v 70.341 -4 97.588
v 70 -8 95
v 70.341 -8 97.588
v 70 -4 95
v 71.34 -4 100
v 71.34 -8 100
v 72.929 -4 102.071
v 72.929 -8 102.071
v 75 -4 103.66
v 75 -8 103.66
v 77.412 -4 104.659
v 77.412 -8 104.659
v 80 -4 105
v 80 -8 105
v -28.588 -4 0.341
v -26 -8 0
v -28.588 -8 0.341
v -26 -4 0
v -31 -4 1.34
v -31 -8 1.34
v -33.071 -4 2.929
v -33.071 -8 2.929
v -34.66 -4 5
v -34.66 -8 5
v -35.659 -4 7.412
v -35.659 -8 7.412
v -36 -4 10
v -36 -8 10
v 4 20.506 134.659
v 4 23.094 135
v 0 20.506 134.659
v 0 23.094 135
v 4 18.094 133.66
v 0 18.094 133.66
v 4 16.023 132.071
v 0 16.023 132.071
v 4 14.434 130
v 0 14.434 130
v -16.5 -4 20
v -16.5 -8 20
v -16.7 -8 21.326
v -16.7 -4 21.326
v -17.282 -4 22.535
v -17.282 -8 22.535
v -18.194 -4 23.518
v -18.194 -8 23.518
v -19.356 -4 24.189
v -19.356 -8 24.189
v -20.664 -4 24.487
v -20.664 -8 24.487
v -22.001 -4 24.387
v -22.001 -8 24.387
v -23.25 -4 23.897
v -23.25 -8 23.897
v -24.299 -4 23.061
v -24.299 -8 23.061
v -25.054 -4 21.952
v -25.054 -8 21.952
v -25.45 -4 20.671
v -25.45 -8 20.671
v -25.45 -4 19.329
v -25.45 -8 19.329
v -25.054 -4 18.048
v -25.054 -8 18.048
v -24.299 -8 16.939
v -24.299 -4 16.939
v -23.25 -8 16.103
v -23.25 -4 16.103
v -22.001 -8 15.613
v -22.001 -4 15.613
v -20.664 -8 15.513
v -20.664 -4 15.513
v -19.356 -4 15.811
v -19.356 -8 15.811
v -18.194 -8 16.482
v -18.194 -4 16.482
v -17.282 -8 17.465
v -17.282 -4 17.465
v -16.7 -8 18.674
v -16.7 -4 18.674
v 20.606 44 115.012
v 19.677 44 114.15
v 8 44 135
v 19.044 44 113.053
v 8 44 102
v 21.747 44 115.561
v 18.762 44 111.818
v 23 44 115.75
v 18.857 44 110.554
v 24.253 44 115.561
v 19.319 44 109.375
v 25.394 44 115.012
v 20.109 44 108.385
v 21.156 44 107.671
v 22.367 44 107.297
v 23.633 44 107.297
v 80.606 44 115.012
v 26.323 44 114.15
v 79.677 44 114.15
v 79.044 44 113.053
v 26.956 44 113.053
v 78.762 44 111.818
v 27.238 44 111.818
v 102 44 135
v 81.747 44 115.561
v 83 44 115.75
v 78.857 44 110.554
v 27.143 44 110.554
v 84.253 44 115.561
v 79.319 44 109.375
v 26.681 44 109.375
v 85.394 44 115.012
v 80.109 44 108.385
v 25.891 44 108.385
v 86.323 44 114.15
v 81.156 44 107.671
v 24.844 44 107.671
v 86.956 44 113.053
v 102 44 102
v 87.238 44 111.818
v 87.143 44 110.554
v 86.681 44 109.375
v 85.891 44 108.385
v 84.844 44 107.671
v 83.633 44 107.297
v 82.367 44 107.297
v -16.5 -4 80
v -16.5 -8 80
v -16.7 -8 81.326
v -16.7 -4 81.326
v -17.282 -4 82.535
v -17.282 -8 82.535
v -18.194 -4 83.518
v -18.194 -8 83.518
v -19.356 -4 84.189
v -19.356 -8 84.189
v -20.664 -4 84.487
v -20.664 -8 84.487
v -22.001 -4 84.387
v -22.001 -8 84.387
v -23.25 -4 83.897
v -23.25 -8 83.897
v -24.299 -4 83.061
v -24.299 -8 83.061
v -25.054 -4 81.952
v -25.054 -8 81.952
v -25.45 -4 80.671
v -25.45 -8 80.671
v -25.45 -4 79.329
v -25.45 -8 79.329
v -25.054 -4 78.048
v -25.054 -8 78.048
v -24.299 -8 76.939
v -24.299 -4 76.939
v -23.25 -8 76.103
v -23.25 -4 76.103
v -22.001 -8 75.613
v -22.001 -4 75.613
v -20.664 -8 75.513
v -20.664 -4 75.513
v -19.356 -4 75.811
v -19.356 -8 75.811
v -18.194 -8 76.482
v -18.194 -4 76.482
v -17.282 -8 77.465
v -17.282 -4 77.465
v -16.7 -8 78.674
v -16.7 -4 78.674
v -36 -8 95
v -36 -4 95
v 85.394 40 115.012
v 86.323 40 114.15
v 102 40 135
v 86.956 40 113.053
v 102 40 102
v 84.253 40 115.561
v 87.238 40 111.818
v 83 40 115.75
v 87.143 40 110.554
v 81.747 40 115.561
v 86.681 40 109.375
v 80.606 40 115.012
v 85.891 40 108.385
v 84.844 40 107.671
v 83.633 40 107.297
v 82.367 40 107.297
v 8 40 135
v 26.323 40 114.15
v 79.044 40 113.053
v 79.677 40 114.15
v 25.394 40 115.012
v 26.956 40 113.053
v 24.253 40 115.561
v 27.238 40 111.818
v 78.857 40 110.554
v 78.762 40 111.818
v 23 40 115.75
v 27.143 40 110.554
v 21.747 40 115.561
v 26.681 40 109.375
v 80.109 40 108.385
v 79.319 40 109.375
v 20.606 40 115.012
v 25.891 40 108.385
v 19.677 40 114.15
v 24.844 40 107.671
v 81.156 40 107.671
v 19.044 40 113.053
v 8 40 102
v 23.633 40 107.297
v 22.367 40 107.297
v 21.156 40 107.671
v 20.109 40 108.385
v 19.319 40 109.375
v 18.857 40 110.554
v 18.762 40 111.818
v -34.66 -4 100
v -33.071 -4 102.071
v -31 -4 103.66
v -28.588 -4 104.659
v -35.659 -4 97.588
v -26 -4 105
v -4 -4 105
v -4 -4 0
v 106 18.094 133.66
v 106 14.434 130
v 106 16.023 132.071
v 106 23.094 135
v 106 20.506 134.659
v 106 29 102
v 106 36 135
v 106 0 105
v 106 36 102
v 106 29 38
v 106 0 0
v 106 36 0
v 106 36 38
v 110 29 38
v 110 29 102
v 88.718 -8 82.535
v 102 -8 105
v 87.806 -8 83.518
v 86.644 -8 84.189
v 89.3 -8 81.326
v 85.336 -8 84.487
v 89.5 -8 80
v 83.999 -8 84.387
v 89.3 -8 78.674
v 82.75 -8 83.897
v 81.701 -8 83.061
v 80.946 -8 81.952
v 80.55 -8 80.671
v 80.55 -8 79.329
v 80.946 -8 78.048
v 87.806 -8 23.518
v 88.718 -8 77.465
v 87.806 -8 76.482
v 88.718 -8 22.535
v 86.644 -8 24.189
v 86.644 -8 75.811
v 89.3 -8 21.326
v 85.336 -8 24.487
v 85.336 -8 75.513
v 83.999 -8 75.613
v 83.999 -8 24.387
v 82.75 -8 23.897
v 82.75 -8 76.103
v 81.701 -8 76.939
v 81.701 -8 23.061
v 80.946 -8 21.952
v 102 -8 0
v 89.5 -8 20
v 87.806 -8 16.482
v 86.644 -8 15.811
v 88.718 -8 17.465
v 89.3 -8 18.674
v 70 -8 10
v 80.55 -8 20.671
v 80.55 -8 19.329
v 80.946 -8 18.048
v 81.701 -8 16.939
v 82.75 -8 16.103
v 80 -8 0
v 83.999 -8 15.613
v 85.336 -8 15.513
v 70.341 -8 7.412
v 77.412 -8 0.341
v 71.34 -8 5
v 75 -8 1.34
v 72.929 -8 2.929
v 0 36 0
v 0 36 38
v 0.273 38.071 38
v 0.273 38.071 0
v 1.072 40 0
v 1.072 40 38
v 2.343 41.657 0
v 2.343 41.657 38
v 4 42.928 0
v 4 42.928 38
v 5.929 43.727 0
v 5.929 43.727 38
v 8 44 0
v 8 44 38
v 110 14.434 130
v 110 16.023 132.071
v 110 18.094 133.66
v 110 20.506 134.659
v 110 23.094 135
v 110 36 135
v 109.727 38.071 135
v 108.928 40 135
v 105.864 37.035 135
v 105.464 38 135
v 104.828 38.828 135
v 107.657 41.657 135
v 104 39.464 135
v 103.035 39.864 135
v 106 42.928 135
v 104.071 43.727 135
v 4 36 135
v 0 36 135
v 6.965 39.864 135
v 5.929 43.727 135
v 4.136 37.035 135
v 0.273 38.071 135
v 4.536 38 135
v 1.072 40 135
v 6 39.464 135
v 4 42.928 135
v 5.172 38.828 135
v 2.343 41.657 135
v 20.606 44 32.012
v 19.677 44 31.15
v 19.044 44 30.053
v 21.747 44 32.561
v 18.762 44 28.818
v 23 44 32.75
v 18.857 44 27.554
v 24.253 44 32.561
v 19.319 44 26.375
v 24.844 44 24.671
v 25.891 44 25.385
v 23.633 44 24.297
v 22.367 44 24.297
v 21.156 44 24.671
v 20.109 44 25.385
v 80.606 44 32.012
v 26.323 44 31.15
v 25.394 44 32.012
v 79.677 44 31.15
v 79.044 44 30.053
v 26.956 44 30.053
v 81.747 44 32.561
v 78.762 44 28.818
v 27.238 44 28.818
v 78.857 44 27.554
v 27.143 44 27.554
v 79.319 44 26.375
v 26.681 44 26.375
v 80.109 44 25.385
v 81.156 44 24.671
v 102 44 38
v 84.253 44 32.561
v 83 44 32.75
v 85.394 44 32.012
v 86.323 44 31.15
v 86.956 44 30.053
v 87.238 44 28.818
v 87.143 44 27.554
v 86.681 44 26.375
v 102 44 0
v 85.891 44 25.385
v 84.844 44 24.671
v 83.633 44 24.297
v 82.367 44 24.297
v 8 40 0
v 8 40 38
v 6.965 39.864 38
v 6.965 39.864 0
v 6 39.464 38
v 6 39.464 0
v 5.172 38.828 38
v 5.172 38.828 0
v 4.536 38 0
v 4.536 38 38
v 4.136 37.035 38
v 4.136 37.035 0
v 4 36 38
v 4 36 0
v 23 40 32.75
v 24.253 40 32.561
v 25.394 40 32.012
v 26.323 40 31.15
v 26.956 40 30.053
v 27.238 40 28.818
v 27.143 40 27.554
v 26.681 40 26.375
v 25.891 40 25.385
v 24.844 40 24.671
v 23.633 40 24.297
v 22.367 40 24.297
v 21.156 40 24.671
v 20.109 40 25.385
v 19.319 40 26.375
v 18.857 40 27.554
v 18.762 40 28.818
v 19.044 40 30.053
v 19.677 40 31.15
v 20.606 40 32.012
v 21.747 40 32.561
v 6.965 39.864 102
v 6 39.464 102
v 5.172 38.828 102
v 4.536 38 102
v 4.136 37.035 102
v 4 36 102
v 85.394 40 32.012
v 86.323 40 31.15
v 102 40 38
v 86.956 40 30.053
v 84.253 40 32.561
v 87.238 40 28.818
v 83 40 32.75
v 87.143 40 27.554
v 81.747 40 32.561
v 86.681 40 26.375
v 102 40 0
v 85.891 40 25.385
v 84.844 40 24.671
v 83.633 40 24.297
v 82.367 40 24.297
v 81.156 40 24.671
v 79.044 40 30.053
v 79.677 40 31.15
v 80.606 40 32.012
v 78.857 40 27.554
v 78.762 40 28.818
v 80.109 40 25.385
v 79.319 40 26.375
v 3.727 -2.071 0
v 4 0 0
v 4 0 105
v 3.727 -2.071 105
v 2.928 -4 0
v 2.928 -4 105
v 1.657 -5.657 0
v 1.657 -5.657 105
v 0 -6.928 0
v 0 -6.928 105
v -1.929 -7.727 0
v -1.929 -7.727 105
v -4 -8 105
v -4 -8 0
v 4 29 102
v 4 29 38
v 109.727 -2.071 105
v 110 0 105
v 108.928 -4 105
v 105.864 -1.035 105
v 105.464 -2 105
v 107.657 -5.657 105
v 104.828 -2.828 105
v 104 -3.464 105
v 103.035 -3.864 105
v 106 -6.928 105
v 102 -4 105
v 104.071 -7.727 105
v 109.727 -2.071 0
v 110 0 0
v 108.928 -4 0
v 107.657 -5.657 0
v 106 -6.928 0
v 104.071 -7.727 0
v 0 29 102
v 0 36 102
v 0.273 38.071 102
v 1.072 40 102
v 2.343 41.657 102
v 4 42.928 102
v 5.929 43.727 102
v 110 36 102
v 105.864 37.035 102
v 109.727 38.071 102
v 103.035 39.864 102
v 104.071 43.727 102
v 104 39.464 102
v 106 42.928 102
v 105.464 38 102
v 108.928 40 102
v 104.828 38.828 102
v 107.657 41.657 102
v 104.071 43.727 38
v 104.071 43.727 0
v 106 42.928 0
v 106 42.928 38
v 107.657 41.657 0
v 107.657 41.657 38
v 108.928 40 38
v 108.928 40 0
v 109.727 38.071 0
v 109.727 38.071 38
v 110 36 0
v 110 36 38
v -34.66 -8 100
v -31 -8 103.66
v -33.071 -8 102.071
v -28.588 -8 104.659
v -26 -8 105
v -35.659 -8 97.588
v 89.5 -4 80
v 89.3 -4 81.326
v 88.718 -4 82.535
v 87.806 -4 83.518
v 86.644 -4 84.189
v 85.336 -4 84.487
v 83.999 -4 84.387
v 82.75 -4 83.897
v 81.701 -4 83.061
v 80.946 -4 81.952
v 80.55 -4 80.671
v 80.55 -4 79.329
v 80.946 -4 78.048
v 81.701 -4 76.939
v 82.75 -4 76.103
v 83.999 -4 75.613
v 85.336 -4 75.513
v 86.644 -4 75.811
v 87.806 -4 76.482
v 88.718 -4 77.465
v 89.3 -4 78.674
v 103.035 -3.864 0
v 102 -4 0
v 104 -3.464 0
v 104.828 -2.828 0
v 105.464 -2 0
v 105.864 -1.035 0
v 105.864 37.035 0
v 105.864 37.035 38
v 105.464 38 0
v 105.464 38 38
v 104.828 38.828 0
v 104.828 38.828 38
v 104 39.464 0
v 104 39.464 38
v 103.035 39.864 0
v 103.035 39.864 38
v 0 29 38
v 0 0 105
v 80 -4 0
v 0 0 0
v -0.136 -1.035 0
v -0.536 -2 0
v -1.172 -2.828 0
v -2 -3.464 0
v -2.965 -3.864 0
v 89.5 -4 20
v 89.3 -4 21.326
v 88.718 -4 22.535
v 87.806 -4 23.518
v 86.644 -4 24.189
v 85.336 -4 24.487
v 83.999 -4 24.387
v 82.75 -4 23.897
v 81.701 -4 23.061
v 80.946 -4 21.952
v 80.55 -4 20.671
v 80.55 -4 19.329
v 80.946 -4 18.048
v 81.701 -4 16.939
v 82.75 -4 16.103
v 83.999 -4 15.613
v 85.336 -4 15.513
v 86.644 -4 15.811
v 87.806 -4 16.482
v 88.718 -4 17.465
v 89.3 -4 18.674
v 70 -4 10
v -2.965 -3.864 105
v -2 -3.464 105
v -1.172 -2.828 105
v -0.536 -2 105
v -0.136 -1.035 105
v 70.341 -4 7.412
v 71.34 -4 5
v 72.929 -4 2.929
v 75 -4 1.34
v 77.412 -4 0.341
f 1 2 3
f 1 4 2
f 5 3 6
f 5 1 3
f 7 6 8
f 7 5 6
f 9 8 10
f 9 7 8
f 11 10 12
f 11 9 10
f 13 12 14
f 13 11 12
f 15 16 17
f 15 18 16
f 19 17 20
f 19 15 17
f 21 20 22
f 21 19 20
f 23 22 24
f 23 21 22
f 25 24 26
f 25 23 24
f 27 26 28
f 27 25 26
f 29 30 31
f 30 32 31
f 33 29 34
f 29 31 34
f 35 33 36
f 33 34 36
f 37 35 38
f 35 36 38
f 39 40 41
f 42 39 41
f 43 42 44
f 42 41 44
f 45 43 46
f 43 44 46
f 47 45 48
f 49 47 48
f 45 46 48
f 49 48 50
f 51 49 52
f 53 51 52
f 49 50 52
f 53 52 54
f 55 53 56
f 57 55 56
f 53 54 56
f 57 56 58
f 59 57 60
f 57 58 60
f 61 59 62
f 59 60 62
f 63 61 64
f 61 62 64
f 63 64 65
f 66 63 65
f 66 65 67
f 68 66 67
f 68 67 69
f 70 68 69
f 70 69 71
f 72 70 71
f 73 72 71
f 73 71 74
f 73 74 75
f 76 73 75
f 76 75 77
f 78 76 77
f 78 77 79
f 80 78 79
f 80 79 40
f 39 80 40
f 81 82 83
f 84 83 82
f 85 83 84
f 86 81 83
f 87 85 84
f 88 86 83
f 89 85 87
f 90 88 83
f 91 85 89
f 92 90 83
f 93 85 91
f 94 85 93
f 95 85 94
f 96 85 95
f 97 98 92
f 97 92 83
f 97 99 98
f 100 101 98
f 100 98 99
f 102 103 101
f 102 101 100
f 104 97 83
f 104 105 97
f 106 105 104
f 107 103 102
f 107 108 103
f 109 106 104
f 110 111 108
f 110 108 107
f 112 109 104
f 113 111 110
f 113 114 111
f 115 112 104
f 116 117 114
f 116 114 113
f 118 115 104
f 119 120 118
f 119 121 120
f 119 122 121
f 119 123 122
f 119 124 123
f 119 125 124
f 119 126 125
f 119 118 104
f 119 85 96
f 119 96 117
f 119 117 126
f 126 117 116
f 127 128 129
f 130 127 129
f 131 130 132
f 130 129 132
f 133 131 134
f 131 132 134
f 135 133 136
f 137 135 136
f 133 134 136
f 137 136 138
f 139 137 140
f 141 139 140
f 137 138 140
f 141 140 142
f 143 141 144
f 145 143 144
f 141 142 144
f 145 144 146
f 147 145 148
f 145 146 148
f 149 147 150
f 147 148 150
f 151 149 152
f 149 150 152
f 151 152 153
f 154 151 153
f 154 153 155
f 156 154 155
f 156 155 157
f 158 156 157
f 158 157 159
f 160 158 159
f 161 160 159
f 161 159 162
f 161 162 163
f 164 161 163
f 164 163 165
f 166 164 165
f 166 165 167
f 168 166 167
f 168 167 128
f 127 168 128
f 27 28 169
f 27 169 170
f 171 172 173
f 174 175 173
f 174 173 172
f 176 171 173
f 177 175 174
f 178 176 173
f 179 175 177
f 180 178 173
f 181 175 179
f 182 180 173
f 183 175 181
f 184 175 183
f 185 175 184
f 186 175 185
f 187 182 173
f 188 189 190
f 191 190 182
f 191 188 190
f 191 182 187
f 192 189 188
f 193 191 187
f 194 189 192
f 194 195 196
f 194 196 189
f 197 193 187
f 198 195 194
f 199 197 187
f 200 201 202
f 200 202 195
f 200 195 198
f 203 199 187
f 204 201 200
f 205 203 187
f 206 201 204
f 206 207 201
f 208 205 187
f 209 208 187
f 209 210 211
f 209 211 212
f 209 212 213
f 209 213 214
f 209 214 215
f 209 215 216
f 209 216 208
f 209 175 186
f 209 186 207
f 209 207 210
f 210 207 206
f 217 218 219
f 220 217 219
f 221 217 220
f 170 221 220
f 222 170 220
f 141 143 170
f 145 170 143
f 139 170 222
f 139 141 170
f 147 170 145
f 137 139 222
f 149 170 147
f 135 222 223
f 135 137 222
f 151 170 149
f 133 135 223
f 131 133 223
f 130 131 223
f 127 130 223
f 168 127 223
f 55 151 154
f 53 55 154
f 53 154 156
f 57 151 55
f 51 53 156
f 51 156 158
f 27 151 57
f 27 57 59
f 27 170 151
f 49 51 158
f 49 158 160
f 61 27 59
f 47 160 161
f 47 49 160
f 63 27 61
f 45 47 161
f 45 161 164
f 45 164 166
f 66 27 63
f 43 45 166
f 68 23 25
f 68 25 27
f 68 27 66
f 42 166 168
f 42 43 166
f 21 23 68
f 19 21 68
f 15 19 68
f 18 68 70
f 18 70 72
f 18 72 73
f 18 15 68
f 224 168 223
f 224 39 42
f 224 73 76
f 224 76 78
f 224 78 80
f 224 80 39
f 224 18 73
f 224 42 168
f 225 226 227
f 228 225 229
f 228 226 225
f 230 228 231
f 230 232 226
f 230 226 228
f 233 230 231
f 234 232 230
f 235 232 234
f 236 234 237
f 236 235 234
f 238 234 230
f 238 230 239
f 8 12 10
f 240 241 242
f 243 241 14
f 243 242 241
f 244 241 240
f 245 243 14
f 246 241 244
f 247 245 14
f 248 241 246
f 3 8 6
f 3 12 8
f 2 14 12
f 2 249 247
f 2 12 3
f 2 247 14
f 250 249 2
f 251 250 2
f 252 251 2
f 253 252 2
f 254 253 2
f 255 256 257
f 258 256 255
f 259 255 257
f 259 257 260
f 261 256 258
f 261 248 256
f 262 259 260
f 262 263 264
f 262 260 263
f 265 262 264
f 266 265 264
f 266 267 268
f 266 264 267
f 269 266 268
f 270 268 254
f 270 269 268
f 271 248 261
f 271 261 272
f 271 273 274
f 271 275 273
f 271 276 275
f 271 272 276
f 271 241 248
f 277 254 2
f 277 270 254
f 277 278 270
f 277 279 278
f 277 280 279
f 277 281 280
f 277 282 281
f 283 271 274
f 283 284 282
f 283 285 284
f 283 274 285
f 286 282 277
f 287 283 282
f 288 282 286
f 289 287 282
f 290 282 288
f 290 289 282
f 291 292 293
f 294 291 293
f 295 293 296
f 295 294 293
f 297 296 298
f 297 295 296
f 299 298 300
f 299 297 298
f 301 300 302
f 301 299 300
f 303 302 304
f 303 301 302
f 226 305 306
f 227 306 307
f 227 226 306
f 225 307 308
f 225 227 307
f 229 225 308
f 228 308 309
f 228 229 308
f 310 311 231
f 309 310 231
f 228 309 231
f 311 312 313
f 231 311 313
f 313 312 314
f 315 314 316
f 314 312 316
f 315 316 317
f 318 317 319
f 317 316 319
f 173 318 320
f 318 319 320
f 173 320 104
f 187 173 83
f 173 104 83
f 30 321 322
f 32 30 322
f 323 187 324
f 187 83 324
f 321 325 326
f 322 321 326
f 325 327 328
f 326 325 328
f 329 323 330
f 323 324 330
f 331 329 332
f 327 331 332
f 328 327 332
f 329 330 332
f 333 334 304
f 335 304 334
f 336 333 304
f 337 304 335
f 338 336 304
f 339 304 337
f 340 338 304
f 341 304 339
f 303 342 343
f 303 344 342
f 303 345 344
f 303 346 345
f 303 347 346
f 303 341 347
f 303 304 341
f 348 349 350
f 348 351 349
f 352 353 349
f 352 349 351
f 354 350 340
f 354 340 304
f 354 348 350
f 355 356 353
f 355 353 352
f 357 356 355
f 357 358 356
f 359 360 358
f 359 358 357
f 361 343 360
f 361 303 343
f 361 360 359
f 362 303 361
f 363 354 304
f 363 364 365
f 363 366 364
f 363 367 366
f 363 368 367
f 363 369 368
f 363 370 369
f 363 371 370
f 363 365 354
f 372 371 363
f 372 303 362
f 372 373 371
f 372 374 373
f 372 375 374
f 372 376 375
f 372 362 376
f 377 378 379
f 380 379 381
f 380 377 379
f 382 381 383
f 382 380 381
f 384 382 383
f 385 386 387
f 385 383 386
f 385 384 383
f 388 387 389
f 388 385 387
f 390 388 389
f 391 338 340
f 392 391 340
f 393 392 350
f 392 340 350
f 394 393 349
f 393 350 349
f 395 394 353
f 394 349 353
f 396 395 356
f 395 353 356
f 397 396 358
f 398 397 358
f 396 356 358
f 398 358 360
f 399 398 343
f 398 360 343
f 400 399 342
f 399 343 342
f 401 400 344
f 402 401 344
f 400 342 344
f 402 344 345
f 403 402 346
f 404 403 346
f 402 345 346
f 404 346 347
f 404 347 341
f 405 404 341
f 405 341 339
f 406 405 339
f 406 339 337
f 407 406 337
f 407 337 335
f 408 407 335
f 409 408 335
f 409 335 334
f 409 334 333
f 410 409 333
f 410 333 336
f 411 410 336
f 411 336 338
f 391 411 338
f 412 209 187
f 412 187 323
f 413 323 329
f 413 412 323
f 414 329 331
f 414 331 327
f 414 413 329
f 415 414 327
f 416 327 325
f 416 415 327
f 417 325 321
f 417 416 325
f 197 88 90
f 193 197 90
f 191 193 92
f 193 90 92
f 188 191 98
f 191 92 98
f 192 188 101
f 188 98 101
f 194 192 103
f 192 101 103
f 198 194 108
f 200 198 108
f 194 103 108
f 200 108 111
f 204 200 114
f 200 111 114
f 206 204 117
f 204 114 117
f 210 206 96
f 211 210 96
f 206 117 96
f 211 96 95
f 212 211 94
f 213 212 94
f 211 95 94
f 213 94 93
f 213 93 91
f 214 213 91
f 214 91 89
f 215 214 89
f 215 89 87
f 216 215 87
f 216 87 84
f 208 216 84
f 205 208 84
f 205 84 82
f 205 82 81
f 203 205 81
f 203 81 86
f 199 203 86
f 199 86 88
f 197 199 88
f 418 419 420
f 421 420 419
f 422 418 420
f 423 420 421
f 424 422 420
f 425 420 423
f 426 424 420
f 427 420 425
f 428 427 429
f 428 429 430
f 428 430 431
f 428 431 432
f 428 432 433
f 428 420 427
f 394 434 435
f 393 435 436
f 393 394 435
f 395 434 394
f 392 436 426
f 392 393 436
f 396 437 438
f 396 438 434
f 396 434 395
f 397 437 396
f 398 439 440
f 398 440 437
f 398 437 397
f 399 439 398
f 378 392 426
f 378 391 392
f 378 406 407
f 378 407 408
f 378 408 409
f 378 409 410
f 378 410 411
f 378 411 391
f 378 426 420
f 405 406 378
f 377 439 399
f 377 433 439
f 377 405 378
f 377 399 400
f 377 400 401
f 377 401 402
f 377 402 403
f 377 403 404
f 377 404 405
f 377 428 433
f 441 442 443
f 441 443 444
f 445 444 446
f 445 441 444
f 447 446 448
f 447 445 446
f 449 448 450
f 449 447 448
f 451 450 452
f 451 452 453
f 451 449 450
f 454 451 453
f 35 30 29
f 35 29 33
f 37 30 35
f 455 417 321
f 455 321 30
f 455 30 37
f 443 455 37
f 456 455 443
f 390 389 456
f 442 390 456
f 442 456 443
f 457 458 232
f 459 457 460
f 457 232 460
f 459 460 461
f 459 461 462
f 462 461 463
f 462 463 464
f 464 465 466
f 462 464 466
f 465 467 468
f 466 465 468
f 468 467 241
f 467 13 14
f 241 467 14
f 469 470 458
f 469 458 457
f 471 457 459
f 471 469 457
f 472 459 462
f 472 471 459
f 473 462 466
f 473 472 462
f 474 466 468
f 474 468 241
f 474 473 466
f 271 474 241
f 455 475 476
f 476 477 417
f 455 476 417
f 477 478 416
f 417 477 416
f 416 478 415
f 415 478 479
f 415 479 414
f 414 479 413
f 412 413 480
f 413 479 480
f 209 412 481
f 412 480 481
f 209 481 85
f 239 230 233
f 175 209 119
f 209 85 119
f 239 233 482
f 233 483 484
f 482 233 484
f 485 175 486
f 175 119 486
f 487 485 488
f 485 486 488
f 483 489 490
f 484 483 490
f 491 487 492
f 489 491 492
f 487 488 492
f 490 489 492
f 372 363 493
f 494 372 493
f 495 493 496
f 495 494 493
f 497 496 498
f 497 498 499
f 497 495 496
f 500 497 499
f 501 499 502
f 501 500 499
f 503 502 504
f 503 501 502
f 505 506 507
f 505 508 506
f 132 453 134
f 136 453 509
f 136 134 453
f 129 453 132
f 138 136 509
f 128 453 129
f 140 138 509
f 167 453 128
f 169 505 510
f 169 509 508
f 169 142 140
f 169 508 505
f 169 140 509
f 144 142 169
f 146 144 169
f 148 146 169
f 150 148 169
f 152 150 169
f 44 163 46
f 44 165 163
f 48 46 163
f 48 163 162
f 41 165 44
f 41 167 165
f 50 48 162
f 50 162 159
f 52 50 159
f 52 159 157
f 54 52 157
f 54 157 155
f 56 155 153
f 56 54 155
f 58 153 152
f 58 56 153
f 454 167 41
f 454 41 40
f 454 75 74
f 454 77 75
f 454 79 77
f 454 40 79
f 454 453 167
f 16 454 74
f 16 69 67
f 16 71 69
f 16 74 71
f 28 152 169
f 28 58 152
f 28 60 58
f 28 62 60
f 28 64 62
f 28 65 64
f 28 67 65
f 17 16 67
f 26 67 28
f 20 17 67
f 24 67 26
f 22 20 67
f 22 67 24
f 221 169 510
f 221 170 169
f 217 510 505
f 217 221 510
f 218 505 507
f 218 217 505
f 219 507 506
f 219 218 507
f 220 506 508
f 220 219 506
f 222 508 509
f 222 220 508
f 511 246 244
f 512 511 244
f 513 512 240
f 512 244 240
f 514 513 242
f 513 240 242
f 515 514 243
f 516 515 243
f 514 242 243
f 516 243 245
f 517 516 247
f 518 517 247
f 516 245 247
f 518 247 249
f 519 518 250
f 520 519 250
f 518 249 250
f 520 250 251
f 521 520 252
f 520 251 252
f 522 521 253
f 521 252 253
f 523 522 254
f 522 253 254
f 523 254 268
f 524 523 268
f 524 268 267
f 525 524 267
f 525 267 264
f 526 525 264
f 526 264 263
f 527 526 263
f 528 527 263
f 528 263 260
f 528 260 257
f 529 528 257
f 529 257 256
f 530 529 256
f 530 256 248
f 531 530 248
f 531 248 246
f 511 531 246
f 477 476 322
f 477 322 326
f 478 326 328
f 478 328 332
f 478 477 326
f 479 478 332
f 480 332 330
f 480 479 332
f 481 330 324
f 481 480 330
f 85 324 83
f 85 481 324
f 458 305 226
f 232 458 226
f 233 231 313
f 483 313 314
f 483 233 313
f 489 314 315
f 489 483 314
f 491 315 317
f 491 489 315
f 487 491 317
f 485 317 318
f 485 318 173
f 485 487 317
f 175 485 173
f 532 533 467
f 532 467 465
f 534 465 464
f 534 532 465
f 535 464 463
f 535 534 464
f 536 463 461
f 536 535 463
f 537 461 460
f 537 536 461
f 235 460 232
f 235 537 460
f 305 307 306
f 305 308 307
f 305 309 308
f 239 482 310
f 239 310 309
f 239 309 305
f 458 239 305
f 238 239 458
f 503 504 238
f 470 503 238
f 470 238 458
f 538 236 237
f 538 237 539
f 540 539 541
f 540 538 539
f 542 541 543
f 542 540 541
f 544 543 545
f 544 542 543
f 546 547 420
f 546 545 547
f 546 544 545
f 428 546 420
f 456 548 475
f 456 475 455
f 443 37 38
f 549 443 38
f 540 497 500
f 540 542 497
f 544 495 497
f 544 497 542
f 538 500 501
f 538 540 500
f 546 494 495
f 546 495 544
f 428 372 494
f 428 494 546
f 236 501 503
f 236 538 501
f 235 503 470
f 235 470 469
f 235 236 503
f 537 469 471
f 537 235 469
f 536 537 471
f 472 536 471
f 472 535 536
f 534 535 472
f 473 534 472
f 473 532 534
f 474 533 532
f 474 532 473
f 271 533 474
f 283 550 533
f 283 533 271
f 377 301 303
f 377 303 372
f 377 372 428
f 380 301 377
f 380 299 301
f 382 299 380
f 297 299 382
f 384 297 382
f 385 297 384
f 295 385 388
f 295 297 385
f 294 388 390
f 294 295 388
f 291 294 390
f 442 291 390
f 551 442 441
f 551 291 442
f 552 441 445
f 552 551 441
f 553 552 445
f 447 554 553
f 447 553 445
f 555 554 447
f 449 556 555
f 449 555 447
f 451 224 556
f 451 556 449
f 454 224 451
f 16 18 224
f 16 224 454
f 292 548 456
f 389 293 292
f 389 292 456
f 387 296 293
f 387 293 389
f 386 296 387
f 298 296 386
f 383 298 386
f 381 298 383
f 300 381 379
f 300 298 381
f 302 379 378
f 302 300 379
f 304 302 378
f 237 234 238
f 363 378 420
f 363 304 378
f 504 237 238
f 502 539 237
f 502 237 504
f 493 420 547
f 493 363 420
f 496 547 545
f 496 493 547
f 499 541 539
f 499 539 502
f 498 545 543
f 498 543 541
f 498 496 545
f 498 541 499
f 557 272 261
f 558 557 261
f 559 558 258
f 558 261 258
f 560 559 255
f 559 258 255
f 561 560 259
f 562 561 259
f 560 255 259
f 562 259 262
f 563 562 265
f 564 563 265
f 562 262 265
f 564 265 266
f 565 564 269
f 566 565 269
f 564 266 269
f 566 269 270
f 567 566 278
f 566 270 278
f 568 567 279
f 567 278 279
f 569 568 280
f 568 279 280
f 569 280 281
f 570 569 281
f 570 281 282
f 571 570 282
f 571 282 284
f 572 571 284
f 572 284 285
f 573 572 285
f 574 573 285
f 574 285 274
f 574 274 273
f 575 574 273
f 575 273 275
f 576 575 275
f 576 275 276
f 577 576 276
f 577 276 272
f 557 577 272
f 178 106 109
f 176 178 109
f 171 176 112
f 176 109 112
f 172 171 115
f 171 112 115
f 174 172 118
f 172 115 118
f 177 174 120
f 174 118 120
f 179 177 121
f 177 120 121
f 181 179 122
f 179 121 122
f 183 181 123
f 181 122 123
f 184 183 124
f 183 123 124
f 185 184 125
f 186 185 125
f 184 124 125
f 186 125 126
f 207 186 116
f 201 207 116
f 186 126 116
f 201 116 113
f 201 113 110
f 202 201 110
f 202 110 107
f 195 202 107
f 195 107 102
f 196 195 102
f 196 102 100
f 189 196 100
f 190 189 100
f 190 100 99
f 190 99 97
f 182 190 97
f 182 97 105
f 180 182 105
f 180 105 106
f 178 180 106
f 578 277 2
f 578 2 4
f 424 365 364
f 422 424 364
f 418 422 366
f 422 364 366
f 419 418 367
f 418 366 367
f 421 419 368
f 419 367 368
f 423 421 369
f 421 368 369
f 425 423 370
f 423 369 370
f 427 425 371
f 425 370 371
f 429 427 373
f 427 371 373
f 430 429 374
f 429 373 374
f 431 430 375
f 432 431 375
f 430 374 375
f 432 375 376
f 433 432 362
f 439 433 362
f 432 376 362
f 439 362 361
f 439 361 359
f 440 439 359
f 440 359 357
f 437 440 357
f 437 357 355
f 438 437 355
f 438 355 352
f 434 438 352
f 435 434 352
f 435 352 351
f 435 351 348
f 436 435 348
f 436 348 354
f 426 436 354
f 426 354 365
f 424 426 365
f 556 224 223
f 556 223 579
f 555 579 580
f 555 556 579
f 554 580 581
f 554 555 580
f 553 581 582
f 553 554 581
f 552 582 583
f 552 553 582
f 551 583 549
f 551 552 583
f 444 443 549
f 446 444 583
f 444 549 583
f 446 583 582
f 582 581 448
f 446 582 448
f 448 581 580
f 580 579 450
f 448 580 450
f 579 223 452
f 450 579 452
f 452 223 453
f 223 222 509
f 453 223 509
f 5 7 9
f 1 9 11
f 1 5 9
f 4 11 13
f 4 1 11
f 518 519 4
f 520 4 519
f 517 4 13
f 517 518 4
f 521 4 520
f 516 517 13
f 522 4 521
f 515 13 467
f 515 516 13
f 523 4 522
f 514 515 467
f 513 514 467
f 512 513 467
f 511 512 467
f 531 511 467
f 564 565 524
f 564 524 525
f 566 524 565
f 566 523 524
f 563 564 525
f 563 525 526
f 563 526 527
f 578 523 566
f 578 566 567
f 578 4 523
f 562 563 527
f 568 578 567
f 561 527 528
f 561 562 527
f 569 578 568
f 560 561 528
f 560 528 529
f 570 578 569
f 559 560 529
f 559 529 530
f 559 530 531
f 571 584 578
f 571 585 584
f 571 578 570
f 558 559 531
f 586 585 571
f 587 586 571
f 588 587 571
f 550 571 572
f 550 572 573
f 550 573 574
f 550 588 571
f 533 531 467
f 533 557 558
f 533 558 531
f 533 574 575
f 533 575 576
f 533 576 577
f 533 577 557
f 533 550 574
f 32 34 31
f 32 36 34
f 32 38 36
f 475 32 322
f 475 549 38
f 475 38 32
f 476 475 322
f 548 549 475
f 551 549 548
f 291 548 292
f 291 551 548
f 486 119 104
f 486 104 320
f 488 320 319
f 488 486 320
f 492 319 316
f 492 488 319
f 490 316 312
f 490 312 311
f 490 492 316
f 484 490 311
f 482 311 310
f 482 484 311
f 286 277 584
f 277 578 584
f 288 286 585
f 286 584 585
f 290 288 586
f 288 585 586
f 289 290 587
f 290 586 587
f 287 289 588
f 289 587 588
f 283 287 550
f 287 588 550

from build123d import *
from OCP.BRepFilletAPI import BRepFilletAPI_MakeChamfer

# Parameters (mm, degrees)
TABAN_FLAN_1_DEPTH      = 135
IZIM10_R                = 4.25
KES_EKSTR_ZYON1_DEPTH   = 10
IZIM11_W                = 140
IZIM11_H                = 64
KES_EKSTR_ZYON2_DEPTH   = 15
PAH1_SIZE               = 30
PAH1_SIZE2              = 17.320508076
KENAR_FLAN_1_DEPTH      = 105
KENAR_FLAN_1_BEND_DEPTH = 105
RADYUS1_R               = 10
IZIM18_R                = 4.5
KES_EKSTR_ZYON3_DEPTH   = 20
RADYUS2_R               = 10


# Sheet-metal steps are written as plain solids
with BuildPart() as part:
    # Çizim1 → Taban-Flanş1 (new body)
    with BuildSketch(Plane.XY):
        with BuildLine():
            Line((0, 0), (0, 36))
            ThreePointArc((0, 36), (2.343145751, 41.656854249), (8, 44))
            Line((8, 44), (102, 44))
            ThreePointArc((102, 44), (107.656854249, 41.656854249), (110, 36))
            Line((110, 36), (110, 0))
            Line((110, 0), (106, 0))
            Line((106, 0), (106, 36))
            ThreePointArc((106, 36), (104.828427125, 38.828427125), (102, 40))
            Line((102, 40), (8, 40))
            ThreePointArc((8, 40), (5.171572875, 38.828427125), (4, 36))
            Line((4, 36), (4, 0))
            Line((4, 0), (0, 0))
        make_face()
    extrude(amount=TABAN_FLAN_1_DEPTH)

    # Çizim10 → Kes-Ekstrüzyon1 (cut)
    with BuildSketch(Plane(origin=(0, 44, 0), x_dir=(1, 0, 0), z_dir=(0, 1, 0))):
        with Locations(Location((23, -111.5, 0), (0, 0, 270))):
            Circle(IZIM10_R)
        with Locations(Location((83, -111.5, 0), (0, 0, 270))):
            Circle(IZIM10_R)
        with Locations(Location((83, -28.5, 0), (0, 0, 270))):
            Circle(IZIM10_R)
        with Locations(Location((23, -28.5, 0), (0, 0, 270))):
            Circle(IZIM10_R)
    extrude(amount=-KES_EKSTR_ZYON1_DEPTH, mode=Mode.SUBTRACT)

    # Çizim11 → Kes-Ekstrüzyon2 (cut)
    with BuildSketch(Plane(origin=(0, 44, 0), x_dir=(1, 0, 0), z_dir=(0, 1, 0))):
        with Locations((55, -70)):
            Rectangle(IZIM11_W, IZIM11_H)
    extrude(amount=-KES_EKSTR_ZYON2_DEPTH, mode=Mode.SUBTRACT)

    # Pah1: one chamfer whose edges measure the first distance from different faces: ONE call of the kernel's chamfer builder (chamfer() names one face for all edges)
    pah1_edges_1 = [part.edges().sort_by_distance(p)[0] for p in [
        (2, 0, 135),
    ]]
    pah1_side_1 = [part.faces().sort_by_distance(p)[0] for p in [
        (2, 0, 67.5),
    ]]
    pah1_edges_2 = [part.edges().sort_by_distance(p)[0] for p in [
        (108, 0, 135),
    ]]
    pah1_side_2 = [part.faces().sort_by_distance(p)[0] for p in [
        (108, 0, 67.5),
    ]]
    pah1 = BRepFilletAPI_MakeChamfer(part.part.solid().wrapped)
    for e in pah1_edges_1:
        pah1.Add(PAH1_SIZE, PAH1_SIZE2, e.wrapped, pah1_side_1[0].wrapped)  # the first distance lies on this face
    for e in pah1_edges_2:
        pah1.Add(PAH1_SIZE, PAH1_SIZE2, e.wrapped, pah1_side_2[0].wrapped)  # the first distance lies on this face
    add(Compound.cast(pah1.Shape()), mode=Mode.REPLACE)

    # Kenar-Flanş1 section (across the edge) → Kenar-Flanş1 (add)
    with BuildSketch(Plane(origin=(0, -4, 0), x_dir=(0, 1, 0), z_dir=(0, 0, 1))):
        with BuildLine():
            Line((-4, 4), (-4, 36))
            Line((-4, 36), (0, 36))
            Line((0, 36), (0, 4))
            ThreePointArc((0, 4), (1.171572875, 1.171572875), (4, 0))
            Line((4, 0), (4, -4))
            ThreePointArc((4, -4), (-1.656854249, -1.656854249), (-4, 4))
        make_face()
    extrude(amount=KENAR_FLAN_1_DEPTH)

    # Kenar-Flanş1 section 2 (across the edge) → Kenar-Flanş1 bend (add)
    with BuildSketch(Plane(origin=(106, -4, 0), x_dir=(0, 1, 0), z_dir=(0, 0, 1))):
        with BuildLine():
            Line((-4, 4), (-4, 36))
            Line((-4, 36), (0, 36))
            Line((0, 36), (0, 4))
            ThreePointArc((0, 4), (1.171572875, 1.171572875), (4, 0))
            Line((4, 0), (4, -4))
            ThreePointArc((4, -4), (-1.656854249, -1.656854249), (-4, 4))
        make_face()
    extrude(amount=KENAR_FLAN_1_BEND_DEPTH)

    # Radyus1
    radyus1_edges = [part.edges().sort_by_distance(p)[0] for p in [
        (-36, -6, 0),
        (-36, -6, 105),
        (70, -6, 0),
        (70, -6, 105),
    ]]
    fillet(radyus1_edges, radius=RADYUS1_R)

    # Çizim18 → Kes-Ekstrüzyon3 (cut)
    with BuildSketch(Plane.XZ.offset(8)):
        with Locations((85, 80)):
            Circle(IZIM18_R)
        with Locations((85, 20)):
            Circle(IZIM18_R)
        with Locations((-21, 80)):
            Circle(IZIM18_R)
        with Locations((-21, 20)):
            Circle(IZIM18_R)
    extrude(amount=-KES_EKSTR_ZYON3_DEPTH, mode=Mode.SUBTRACT)

    # Radyus2
    radyus2_edges = [part.edges().sort_by_distance(p)[0] for p in [
        (108, 17.320508076, 135),
        (2, 17.320508076, 135),
    ]]
    fillet(radyus2_edges, radius=RADYUS2_R)


solid = part.part
